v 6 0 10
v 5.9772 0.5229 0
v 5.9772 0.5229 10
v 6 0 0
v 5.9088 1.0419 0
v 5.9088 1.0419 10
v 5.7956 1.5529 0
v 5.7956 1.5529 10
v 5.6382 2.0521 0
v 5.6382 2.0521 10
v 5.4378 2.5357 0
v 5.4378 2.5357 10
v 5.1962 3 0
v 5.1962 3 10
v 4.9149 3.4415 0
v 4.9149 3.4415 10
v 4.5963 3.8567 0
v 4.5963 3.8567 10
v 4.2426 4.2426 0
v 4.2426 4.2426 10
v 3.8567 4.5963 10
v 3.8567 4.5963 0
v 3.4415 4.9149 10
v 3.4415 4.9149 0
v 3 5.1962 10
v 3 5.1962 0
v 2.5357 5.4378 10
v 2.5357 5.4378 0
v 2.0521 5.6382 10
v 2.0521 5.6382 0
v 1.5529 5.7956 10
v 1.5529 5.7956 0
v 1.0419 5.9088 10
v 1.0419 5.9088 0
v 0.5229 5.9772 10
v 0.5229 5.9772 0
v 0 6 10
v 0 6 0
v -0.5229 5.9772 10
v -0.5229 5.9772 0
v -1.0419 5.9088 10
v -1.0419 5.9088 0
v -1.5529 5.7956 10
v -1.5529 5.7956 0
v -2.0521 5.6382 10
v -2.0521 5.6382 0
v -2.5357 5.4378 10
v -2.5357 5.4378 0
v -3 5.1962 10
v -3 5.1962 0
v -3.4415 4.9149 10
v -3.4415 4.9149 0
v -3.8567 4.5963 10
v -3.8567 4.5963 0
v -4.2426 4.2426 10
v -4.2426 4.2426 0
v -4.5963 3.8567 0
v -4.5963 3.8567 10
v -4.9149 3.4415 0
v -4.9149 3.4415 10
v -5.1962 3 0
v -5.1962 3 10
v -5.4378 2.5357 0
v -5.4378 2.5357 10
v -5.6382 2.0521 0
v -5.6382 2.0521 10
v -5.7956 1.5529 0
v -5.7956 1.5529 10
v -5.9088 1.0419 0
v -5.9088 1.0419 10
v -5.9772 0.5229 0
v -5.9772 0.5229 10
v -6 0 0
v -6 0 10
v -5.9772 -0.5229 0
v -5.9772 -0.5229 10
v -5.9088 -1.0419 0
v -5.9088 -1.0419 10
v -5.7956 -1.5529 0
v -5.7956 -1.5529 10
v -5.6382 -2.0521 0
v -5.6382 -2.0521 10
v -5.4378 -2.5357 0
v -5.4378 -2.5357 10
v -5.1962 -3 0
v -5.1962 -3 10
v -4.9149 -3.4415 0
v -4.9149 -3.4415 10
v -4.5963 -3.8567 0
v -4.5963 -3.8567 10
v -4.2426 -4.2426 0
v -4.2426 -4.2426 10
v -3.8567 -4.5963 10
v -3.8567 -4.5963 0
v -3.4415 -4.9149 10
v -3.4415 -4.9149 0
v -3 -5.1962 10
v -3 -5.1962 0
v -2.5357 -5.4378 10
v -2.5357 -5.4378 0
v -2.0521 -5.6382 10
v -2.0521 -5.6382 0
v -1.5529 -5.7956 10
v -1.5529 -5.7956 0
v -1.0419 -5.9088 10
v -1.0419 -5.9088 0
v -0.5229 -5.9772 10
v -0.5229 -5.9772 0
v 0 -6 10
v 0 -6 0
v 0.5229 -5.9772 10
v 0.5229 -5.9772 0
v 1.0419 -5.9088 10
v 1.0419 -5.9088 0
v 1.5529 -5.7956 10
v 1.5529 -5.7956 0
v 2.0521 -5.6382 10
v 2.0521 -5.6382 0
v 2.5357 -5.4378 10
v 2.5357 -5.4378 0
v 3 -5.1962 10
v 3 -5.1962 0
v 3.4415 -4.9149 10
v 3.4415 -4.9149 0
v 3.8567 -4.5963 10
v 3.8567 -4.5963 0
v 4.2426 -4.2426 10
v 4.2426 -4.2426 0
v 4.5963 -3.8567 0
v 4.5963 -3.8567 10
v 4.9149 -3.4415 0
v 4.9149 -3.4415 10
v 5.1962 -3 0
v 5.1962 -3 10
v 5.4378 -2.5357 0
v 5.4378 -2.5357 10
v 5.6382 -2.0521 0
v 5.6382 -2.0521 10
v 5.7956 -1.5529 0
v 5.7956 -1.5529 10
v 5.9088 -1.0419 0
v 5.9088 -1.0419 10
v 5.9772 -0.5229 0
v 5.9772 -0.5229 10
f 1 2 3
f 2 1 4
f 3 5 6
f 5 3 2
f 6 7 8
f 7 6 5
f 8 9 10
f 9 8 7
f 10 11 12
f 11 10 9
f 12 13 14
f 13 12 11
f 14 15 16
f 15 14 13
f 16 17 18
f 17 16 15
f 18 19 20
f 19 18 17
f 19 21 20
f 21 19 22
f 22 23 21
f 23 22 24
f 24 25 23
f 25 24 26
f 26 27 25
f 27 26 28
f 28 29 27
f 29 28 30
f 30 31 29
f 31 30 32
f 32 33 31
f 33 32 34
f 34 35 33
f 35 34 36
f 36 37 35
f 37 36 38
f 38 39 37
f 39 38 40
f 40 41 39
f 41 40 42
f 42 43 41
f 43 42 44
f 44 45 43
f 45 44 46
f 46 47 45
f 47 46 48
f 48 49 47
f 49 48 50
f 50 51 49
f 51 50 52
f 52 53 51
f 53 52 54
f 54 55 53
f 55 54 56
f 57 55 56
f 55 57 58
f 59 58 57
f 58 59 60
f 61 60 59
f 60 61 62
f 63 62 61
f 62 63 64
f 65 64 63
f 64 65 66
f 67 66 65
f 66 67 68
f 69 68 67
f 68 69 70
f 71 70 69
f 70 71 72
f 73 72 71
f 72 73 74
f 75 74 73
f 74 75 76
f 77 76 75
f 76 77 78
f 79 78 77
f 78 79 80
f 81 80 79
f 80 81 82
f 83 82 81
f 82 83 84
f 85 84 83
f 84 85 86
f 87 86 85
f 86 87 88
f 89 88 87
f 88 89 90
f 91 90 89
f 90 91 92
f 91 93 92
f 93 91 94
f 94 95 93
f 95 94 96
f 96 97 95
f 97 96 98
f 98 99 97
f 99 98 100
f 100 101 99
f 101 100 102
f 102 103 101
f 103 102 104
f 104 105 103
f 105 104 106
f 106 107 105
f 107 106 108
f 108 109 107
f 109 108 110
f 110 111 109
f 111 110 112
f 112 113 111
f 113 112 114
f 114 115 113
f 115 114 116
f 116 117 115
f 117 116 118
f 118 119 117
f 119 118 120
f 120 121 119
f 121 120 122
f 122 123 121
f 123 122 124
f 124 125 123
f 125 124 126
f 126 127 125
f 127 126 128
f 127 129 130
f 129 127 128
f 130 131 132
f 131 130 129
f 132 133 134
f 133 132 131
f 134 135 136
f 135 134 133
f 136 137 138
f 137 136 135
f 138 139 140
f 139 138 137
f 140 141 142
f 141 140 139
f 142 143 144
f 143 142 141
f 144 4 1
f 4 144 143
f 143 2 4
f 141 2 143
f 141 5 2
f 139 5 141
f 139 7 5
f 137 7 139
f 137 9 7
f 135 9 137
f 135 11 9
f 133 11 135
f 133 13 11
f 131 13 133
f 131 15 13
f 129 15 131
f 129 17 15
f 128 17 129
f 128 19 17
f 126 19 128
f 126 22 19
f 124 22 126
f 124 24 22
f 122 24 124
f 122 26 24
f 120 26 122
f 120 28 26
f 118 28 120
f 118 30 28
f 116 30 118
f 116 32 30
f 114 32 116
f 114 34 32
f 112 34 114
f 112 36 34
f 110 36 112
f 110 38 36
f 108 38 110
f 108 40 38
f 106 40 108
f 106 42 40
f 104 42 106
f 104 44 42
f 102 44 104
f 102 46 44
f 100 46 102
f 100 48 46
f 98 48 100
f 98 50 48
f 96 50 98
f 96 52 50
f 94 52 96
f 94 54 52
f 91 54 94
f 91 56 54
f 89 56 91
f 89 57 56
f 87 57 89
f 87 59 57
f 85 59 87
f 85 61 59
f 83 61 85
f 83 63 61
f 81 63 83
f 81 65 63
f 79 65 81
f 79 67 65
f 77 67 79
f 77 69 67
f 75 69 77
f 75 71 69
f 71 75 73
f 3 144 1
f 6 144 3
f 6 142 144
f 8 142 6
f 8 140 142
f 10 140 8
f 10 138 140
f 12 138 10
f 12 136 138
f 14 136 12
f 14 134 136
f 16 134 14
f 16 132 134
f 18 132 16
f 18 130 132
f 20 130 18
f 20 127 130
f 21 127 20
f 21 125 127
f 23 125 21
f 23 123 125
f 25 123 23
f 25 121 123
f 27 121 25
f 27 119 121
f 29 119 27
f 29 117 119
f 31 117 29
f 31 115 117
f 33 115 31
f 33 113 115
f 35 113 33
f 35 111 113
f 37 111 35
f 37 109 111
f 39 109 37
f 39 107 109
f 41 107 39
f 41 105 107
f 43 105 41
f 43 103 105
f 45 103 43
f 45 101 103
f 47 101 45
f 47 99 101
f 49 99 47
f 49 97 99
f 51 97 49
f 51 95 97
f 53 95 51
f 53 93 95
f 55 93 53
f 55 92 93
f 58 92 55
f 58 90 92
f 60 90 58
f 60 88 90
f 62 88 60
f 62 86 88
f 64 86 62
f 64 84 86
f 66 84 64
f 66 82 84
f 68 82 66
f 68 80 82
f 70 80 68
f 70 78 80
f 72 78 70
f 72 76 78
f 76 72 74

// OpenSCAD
// Construct: special variables $fn / $fa / $fs controlling faceting.
$fn = 0;
$fa = 5;
$fs = 0.4;
cylinder(h = 10, r = 6);
